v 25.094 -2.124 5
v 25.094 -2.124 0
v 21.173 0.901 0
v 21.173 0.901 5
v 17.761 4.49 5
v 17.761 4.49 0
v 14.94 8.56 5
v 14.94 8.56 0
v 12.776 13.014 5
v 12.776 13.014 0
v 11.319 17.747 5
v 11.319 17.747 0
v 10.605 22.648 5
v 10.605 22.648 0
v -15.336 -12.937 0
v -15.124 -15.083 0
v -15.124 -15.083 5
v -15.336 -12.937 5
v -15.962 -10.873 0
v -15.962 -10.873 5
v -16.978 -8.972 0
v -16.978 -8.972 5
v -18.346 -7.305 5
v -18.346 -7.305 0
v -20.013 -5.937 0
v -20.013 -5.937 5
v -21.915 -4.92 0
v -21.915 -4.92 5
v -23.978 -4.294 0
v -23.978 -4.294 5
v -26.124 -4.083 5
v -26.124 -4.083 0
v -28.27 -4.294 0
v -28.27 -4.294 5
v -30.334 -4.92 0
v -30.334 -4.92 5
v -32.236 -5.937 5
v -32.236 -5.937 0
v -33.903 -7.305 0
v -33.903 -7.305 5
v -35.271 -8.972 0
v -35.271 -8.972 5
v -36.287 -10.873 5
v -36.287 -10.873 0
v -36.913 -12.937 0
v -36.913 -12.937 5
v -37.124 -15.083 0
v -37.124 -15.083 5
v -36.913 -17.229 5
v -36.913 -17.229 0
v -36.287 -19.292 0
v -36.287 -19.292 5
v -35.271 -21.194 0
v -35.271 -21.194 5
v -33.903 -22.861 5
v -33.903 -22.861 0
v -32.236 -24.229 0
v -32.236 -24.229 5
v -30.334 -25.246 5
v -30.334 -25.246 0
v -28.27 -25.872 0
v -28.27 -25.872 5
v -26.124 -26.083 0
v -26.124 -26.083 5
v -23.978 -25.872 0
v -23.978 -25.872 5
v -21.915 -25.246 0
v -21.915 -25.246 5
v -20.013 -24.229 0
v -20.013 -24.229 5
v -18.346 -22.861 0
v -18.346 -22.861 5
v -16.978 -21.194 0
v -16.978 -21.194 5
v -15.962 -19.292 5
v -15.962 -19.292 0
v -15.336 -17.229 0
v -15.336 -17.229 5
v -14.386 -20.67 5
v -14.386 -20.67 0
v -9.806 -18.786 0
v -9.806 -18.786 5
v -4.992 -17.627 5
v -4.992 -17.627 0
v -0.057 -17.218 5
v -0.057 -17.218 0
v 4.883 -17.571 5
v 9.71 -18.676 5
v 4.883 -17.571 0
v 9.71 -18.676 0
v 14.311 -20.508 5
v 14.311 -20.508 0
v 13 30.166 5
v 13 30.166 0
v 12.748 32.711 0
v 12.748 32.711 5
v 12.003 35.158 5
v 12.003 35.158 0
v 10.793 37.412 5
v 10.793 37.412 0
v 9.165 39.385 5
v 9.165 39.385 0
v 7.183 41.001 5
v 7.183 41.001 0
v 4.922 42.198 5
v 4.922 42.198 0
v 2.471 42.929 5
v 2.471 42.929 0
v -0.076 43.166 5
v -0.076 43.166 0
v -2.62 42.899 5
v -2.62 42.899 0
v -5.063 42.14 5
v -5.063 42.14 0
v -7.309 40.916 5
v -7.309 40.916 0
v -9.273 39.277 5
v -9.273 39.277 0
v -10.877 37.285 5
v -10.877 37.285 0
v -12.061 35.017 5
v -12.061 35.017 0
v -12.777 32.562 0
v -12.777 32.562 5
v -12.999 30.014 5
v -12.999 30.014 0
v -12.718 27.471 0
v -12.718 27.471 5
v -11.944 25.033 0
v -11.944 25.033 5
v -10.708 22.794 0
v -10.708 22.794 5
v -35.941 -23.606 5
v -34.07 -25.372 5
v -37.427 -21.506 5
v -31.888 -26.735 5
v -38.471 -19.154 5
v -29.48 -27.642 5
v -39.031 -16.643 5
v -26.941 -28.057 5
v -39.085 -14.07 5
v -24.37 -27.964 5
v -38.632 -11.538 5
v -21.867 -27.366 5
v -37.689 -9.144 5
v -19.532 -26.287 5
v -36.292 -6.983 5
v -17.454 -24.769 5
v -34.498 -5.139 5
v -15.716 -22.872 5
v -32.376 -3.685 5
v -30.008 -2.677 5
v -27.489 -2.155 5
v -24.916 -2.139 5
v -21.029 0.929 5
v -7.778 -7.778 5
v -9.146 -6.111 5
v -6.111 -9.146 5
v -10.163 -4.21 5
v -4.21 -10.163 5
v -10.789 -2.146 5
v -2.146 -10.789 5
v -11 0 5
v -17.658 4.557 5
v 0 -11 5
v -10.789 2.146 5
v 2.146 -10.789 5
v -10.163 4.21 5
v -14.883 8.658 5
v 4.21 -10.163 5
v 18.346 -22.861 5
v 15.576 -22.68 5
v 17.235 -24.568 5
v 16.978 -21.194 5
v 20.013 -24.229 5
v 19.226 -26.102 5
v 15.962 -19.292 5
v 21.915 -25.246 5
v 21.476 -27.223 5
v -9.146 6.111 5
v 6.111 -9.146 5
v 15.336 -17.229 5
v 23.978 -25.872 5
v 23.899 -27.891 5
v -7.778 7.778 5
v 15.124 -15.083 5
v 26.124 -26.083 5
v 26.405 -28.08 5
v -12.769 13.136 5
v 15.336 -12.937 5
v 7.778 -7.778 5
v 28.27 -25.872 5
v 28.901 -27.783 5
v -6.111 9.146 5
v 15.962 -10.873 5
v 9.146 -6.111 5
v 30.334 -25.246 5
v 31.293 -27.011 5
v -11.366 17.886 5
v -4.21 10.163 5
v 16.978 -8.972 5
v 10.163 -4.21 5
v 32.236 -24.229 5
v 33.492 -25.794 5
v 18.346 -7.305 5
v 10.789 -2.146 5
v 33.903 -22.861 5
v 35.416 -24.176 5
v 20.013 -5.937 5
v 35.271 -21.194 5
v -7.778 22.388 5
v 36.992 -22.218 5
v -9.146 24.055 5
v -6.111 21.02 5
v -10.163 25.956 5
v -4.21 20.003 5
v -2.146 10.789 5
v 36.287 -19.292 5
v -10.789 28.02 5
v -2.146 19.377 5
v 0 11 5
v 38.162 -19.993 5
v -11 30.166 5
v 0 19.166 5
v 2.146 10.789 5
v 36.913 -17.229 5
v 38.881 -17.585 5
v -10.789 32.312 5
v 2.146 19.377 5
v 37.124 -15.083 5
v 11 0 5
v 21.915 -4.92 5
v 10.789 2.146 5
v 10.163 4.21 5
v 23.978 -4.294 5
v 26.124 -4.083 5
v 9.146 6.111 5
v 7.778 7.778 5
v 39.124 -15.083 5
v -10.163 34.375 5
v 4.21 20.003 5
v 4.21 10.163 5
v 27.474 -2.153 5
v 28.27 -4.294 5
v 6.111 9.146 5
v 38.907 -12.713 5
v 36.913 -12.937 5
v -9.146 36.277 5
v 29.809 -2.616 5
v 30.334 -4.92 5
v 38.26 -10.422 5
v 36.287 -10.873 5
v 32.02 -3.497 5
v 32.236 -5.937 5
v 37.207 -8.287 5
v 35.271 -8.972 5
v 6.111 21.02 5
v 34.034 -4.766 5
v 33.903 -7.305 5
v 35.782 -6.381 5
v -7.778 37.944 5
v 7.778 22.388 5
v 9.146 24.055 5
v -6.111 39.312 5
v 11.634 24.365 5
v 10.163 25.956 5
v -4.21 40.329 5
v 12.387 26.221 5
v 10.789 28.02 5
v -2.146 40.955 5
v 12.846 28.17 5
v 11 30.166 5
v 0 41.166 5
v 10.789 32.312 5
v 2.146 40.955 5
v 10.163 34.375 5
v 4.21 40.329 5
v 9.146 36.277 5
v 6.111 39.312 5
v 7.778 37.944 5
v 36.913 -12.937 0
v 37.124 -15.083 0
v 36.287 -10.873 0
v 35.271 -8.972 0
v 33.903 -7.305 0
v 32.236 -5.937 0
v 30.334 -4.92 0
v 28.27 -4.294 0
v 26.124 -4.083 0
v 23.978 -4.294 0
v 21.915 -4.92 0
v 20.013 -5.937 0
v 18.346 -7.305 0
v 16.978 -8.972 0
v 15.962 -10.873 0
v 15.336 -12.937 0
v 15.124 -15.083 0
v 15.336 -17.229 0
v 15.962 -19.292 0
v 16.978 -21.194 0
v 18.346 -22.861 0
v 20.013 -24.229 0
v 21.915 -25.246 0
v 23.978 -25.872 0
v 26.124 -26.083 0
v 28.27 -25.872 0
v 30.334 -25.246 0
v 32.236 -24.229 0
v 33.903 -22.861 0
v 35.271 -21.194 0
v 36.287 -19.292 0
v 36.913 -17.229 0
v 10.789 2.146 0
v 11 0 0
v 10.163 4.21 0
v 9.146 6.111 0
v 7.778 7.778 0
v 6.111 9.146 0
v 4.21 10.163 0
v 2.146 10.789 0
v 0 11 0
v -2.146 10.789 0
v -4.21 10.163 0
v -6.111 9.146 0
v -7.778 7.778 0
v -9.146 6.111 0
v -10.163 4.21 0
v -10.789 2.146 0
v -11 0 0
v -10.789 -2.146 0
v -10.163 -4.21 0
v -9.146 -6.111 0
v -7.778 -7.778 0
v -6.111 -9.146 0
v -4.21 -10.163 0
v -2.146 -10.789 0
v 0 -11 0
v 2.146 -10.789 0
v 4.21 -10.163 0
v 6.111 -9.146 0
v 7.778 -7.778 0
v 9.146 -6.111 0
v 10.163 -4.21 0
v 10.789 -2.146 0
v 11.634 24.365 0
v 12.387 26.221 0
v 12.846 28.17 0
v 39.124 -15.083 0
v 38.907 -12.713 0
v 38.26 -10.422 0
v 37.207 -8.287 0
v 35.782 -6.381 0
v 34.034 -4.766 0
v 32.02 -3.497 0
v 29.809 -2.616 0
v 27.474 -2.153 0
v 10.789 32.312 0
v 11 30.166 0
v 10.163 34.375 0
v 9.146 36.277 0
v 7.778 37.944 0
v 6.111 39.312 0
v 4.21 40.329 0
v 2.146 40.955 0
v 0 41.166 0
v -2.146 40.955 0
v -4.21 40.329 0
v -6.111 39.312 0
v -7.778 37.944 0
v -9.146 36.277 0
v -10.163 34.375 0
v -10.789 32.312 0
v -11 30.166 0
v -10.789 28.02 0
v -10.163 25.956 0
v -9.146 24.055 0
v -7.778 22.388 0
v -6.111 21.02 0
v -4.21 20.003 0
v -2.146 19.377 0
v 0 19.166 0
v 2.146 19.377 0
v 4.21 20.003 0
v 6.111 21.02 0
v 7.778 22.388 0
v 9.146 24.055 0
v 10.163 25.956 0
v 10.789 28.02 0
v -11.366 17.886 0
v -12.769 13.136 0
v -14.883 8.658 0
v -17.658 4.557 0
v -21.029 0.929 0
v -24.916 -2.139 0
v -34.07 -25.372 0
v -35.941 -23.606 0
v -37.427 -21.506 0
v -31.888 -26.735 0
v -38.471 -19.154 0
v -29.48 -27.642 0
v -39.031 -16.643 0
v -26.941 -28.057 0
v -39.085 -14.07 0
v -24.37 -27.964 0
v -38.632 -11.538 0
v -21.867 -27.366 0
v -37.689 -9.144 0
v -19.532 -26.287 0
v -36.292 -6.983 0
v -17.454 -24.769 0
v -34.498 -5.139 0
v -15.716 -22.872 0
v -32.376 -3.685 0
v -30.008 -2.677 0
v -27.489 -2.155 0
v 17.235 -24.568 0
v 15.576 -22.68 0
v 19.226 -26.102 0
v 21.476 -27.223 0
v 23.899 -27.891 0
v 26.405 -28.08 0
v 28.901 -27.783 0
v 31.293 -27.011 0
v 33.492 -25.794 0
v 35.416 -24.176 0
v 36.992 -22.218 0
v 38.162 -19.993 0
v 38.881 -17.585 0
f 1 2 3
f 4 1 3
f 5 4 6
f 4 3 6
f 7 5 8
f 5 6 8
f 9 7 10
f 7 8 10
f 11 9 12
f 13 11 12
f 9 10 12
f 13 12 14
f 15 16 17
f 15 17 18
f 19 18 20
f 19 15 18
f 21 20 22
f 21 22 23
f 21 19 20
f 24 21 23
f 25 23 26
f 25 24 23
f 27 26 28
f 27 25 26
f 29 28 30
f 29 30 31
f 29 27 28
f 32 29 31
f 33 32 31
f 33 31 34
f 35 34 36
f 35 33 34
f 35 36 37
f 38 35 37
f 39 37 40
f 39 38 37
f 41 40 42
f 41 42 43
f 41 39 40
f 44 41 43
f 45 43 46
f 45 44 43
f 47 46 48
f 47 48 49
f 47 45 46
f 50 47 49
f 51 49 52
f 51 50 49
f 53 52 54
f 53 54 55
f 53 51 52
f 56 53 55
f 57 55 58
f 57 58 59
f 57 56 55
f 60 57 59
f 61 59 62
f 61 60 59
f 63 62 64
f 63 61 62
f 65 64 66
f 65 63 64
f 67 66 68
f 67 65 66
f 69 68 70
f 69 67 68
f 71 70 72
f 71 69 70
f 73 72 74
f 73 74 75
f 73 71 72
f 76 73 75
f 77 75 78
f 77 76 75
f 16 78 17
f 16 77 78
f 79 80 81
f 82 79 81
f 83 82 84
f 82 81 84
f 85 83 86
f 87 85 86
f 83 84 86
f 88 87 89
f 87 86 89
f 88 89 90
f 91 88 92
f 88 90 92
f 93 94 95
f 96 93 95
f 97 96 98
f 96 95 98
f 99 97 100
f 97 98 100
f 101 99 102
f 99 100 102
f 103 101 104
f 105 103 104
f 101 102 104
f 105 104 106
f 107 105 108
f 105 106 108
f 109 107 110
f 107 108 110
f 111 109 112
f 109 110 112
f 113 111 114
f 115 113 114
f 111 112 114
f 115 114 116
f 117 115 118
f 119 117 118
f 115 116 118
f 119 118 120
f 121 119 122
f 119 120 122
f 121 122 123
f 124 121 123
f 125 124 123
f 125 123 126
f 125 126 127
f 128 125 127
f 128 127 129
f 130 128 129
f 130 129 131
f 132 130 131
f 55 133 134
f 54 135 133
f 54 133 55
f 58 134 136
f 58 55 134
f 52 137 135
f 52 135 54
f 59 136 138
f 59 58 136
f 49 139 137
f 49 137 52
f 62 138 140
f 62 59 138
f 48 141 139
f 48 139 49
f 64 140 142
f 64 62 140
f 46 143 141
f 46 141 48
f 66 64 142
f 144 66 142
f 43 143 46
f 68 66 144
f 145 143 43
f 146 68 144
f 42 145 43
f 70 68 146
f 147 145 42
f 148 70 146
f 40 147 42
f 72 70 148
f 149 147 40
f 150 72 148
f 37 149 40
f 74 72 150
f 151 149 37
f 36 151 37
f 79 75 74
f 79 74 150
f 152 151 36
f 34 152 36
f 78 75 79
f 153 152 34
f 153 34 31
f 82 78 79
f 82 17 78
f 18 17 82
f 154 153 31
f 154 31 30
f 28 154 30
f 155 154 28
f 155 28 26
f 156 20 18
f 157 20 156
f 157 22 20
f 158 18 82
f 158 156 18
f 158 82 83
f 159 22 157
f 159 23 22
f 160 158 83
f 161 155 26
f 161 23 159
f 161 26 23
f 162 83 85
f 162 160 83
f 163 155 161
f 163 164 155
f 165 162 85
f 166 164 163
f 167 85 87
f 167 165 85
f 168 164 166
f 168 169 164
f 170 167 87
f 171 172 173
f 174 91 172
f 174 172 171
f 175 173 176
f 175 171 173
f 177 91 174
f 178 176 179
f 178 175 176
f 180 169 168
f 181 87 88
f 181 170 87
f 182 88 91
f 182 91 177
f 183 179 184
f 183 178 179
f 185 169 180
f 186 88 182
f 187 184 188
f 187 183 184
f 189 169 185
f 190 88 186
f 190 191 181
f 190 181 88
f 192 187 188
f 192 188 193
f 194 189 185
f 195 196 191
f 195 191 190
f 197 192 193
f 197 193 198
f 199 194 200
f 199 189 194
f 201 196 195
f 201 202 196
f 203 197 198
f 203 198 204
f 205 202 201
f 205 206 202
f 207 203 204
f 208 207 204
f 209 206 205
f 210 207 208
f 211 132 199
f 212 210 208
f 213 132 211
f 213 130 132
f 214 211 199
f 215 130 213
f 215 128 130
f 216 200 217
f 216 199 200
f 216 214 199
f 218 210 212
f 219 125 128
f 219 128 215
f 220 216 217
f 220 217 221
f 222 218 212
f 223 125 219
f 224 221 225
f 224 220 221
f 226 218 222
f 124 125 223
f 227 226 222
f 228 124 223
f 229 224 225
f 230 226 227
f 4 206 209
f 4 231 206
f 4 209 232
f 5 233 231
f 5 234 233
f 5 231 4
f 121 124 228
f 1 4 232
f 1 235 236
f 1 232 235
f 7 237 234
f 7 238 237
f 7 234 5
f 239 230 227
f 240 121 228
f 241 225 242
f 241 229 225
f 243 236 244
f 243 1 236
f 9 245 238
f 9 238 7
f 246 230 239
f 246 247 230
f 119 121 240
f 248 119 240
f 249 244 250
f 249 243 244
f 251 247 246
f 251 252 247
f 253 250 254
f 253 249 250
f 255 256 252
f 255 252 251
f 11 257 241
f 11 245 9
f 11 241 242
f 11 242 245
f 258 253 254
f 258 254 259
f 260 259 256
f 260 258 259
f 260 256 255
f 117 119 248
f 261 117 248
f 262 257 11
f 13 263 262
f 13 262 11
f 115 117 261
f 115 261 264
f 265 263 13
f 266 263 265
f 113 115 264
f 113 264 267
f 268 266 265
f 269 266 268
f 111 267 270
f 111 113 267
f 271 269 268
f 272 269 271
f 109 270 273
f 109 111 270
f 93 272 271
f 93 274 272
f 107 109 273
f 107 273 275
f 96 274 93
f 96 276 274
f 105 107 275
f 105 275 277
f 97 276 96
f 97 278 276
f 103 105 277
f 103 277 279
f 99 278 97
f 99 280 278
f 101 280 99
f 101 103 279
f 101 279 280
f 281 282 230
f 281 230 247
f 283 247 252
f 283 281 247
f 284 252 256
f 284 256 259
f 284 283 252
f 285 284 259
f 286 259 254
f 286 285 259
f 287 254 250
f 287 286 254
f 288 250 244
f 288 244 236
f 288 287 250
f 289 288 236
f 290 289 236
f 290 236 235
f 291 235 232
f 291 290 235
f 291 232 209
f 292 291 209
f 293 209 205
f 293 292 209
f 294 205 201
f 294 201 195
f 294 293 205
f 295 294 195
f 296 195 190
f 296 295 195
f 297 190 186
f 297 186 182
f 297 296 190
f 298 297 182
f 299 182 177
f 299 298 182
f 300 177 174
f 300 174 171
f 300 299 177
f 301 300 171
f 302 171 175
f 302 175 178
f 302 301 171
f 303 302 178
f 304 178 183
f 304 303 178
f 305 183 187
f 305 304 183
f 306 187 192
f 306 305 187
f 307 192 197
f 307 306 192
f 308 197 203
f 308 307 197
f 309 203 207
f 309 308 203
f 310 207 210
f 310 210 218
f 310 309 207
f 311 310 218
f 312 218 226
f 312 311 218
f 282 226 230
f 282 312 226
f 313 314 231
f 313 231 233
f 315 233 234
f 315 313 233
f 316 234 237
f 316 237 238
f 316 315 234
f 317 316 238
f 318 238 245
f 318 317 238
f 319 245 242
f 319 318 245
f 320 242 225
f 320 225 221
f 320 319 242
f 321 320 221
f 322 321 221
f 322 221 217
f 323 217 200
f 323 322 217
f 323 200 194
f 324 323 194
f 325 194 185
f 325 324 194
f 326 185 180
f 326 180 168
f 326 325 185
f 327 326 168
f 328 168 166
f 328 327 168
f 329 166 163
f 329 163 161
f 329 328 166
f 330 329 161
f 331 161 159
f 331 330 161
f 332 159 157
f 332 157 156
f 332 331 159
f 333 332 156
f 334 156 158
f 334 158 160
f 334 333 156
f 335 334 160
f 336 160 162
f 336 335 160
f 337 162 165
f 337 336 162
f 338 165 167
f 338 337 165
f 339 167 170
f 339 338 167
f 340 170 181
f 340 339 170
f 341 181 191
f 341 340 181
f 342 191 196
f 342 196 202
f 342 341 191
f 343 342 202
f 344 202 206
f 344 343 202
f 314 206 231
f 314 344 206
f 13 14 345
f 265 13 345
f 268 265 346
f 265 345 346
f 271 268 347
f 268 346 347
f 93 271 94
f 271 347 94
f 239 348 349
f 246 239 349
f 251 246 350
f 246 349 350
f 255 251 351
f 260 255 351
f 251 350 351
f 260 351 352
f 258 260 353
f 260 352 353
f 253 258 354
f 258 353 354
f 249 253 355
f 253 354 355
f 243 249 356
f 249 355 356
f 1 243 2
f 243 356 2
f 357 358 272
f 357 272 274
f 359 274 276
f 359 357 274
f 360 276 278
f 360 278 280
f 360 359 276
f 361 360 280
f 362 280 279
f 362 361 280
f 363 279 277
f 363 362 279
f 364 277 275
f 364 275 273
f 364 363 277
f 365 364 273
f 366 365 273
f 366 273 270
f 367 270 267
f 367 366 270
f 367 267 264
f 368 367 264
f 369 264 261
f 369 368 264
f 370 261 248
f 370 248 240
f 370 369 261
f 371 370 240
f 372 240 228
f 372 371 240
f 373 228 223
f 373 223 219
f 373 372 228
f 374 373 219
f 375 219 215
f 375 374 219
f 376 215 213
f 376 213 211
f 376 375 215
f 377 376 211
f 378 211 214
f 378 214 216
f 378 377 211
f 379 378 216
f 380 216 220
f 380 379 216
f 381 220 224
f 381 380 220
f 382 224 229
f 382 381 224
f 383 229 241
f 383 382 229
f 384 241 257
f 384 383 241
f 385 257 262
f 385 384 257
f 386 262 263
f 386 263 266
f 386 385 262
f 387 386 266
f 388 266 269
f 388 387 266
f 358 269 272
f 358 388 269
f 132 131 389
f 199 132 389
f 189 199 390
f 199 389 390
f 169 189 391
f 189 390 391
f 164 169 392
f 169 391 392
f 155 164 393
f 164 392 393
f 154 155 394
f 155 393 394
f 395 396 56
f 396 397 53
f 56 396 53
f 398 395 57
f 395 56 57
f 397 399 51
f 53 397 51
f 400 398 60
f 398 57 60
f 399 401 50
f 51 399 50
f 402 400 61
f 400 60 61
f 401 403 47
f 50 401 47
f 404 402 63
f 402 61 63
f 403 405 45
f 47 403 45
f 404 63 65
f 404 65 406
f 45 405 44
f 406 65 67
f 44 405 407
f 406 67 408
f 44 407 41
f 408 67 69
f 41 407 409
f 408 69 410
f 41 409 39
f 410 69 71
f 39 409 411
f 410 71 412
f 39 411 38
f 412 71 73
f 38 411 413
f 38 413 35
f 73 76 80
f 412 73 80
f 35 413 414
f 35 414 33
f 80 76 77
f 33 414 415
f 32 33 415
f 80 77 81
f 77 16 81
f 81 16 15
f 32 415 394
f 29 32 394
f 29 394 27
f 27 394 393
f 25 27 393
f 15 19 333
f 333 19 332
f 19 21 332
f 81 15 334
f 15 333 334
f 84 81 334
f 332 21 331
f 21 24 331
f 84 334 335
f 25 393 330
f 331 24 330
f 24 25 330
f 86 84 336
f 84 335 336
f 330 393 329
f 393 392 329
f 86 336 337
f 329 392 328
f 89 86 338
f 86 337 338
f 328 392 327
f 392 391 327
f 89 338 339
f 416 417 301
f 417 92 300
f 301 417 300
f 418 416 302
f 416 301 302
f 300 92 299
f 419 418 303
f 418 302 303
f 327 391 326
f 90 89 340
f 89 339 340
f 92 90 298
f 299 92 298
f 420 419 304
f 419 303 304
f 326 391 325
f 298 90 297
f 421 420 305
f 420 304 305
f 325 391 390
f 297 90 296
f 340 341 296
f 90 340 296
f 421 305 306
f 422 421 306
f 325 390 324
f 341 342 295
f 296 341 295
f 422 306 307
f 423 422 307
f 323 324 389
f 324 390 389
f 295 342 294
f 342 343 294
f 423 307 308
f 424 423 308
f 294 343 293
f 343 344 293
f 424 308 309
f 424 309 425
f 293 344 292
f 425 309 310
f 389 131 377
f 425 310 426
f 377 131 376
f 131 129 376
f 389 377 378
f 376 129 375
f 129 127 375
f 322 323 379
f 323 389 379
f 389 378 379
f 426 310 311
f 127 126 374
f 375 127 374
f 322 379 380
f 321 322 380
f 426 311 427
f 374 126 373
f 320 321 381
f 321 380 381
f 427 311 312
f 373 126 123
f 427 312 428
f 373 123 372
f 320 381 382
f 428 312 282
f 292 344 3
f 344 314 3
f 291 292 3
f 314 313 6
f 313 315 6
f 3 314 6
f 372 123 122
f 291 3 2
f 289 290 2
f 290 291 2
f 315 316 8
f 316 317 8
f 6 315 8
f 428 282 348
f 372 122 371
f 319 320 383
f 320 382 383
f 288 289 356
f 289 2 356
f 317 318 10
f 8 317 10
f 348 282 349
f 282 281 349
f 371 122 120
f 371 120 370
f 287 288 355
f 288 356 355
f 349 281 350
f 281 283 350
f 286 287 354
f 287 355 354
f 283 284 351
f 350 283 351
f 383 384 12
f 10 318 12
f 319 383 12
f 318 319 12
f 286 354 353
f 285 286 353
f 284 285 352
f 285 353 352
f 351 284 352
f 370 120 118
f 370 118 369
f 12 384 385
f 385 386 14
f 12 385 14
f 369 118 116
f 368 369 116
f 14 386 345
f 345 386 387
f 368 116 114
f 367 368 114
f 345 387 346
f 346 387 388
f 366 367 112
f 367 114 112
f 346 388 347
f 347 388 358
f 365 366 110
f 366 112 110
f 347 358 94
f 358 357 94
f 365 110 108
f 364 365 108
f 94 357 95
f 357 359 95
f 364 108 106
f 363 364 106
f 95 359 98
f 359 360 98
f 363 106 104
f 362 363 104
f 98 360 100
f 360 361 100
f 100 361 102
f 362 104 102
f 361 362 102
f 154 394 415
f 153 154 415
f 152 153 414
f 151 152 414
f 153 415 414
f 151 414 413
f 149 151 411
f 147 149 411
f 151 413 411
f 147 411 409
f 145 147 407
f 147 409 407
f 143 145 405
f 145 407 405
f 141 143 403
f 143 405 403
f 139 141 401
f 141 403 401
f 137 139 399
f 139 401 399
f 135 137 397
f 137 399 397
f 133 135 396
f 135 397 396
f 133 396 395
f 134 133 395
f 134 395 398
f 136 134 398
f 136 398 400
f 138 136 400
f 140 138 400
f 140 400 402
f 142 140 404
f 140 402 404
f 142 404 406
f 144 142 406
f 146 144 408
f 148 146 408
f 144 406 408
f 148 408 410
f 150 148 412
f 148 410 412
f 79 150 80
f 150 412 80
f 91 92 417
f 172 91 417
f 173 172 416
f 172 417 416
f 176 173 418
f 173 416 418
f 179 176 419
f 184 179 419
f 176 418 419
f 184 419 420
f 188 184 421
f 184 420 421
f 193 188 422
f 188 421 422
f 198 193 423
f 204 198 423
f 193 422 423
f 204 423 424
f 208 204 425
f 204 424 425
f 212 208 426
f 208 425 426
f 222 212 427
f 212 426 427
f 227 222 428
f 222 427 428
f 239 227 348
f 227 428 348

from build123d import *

# Parameters (mm, degrees)
F0_R     = 11
F1_DEPTH = 5


with BuildPart() as f1:
    # F0 (on Top) → F1 (new body)
    with BuildSketch(Plane.XY):
        with BuildLine():
            ThreePointArc((-13.124451, -15.082959), (-16.514327, -6.328217), (-24.916067, -2.139242))
            ThreePointArc((-24.916067, -2.139242), (-37.427089, -21.505605), (-14.386187, -20.669831))
            ThreePointArc((-14.386187, -20.669831), (-13.443808, -17.946747), (-13.124451, -15.082959))
        make_face()
        with Locations((-26.124451, -15.082959)):
            Circle(F0_R, mode=Mode.SUBTRACT)
        with BuildLine():
            ThreePointArc((39.124451, -15.082959), (34.944886, -5.533093), (25.093693, -2.123888))
            ThreePointArc((25.093693, -2.123888), (14.910958, -8.505911), (14.310672, -20.508326))
            ThreePointArc((14.310672, -20.508326), (28.901218, -27.782942), (39.124451, -15.082959))
        make_face()
        with Locations((26.124451, -15.082959)):
            Circle(F0_R, mode=Mode.SUBTRACT)
        with BuildLine():
            ThreePointArc((10.605395, 22.647568), (12.386891, 26.220677), (13, 30.165918))
            ThreePointArc((13, 30.165918), (-3.860209, 42.579571), (-10.707506, 22.793719))
            ThreePointArc((-10.707506, 22.793719), (-0.089144, 17.166224), (10.605395, 22.647568))
        make_face()
        with Locations((0, 30.165918)):
            Circle(F0_R, mode=Mode.SUBTRACT)
        with BuildLine():
            ThreePointArc((10.605395, 22.647568), (-0.089144, 17.166224), (-10.707506, 22.793719))
            ThreePointArc((-10.707506, 22.793719), (-14.883109, 8.658271), (-24.916067, -2.139242))
            ThreePointArc((-24.916067, -2.139242), (-16.514327, -6.328217), (-13.124451, -15.082959))
            ThreePointArc((-13.124451, -15.082959), (-13.443808, -17.946747), (-14.386187, -20.669831))
            ThreePointArc((-14.386187, -20.669831), (-0.056728, -17.218286), (14.310672, -20.508326))
            ThreePointArc((14.310672, -20.508326), (14.910958, -8.505911), (25.093693, -2.123888))
            ThreePointArc((25.093693, -2.123888), (14.939837, 8.560015), (10.605395, 22.647568))
        make_face()
        Circle(F0_R, mode=Mode.SUBTRACT)
    extrude(amount=F1_DEPTH)


solid = f1.part
